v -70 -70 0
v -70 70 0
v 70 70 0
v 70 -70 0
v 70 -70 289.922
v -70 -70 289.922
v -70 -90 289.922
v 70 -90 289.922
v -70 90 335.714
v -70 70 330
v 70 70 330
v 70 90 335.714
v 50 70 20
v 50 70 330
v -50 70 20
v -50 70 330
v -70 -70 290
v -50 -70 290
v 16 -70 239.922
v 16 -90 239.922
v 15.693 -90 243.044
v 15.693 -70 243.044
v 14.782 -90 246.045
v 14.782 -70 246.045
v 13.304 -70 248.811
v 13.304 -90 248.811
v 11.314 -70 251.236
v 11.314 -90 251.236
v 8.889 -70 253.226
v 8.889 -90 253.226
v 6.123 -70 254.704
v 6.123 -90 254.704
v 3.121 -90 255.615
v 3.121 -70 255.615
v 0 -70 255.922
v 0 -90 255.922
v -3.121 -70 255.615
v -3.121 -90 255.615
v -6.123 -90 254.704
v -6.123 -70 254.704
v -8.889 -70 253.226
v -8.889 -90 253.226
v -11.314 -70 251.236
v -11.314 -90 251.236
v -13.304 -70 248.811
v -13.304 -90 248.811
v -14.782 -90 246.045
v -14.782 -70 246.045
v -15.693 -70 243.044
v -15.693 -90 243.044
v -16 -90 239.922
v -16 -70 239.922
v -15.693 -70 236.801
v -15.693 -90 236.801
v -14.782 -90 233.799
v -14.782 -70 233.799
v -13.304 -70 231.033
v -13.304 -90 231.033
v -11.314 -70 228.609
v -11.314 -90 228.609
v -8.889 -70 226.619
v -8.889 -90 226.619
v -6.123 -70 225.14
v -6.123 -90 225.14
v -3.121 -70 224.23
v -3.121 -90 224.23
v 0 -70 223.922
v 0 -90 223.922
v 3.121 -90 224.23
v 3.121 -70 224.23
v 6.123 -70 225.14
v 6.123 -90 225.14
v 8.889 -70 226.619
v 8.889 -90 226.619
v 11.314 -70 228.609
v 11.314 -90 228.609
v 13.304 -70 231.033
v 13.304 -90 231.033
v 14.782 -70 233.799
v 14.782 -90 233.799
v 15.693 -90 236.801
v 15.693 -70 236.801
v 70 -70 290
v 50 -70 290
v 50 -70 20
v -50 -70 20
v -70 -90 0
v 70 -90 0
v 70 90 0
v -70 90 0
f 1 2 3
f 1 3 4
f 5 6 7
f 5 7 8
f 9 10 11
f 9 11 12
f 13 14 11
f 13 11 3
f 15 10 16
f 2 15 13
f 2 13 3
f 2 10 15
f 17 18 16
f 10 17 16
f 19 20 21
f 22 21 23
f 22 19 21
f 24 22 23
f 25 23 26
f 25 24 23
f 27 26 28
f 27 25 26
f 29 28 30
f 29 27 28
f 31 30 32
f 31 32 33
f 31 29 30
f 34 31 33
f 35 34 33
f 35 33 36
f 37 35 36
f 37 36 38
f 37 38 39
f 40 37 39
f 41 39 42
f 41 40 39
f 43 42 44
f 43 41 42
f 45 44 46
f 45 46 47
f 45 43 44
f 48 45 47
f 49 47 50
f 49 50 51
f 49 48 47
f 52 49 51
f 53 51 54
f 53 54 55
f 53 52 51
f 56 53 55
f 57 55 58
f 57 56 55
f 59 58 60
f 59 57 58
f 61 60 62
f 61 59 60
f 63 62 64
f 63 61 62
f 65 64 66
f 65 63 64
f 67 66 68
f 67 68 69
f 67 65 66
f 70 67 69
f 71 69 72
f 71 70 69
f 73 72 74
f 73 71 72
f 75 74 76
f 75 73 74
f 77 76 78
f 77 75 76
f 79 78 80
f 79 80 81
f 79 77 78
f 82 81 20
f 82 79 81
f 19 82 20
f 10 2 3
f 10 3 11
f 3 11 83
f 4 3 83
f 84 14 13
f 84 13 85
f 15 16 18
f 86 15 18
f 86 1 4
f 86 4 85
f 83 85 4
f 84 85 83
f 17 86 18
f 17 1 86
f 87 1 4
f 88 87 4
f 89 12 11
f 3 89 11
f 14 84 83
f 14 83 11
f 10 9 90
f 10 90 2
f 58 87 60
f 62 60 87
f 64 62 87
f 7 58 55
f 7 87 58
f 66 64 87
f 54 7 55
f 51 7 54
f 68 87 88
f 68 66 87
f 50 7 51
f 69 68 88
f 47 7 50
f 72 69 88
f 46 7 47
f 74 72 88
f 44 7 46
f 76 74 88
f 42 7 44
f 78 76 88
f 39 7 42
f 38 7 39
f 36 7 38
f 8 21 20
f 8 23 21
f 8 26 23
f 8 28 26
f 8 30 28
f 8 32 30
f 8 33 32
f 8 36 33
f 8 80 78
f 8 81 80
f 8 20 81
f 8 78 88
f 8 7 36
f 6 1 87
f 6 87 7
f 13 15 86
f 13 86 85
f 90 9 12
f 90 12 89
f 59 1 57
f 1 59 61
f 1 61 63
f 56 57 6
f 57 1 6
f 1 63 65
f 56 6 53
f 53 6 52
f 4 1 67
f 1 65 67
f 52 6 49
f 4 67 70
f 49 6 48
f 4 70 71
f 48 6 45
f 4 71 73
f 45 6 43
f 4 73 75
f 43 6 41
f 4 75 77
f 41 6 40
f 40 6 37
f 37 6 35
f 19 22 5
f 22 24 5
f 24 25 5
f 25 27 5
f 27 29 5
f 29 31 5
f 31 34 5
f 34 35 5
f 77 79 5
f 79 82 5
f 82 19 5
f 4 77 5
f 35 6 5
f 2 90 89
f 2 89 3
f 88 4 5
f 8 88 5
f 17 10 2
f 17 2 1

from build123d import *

# Parameters (mm, degrees)
F0_W     = 100
F0_H     = 140
F1_DEPTH = 20
F2_W     = 140
F2_H     = 289.9223208091
F2_R     = 16
F3_DEPTH = 20
F5_DEPTH = 20
F8_DEPTH = 140


with BuildPart() as f1:
    # F0 (on Top) → F1 (new body)
    with BuildSketch(Plane.XY):
        Rectangle(F0_W, F0_H)
    extrude(amount=F1_DEPTH)

    # F4 (on face) → F5 (join)
    with BuildSketch(Plane(origin=(-50, 0, 0), x_dir=(0, -1, 0), z_dir=(-1, 0, 0))):
        Polygon((-70, 330), (-70, 0), (70, 0), (70, 290), align=None)
    extrude(amount=F5_DEPTH)

    # F6: F1 across plane


with BuildPart() as f3:
    # F2 (on face) → F3 (new body)
    with BuildSketch(Plane.XZ.offset(70)):
        with Locations((0, 144.9611604046)):
            Rectangle(F2_W, F2_H)
        with Locations((0, 239.9223208091)):
            Circle(F2_R, mode=Mode.SUBTRACT)
    extrude(amount=F3_DEPTH)


with BuildPart() as f1_1:
    add(f1.part)
    add(f1.part.mirror(Plane.YZ))


with BuildPart() as f8:
    # F7 (on face) → F8 (new body)
    with BuildSketch(Plane(origin=(-70, 0, 0), x_dir=(0, -1, 0), z_dir=(-1, 0, 0))):
        Polygon((-70, 0), (-70, 330), (-90, 335.7142857143), (-90, 0), align=None)
    extrude(amount=-F8_DEPTH)


solid = Compound([f3.part, f1_1.part, f8.part])
